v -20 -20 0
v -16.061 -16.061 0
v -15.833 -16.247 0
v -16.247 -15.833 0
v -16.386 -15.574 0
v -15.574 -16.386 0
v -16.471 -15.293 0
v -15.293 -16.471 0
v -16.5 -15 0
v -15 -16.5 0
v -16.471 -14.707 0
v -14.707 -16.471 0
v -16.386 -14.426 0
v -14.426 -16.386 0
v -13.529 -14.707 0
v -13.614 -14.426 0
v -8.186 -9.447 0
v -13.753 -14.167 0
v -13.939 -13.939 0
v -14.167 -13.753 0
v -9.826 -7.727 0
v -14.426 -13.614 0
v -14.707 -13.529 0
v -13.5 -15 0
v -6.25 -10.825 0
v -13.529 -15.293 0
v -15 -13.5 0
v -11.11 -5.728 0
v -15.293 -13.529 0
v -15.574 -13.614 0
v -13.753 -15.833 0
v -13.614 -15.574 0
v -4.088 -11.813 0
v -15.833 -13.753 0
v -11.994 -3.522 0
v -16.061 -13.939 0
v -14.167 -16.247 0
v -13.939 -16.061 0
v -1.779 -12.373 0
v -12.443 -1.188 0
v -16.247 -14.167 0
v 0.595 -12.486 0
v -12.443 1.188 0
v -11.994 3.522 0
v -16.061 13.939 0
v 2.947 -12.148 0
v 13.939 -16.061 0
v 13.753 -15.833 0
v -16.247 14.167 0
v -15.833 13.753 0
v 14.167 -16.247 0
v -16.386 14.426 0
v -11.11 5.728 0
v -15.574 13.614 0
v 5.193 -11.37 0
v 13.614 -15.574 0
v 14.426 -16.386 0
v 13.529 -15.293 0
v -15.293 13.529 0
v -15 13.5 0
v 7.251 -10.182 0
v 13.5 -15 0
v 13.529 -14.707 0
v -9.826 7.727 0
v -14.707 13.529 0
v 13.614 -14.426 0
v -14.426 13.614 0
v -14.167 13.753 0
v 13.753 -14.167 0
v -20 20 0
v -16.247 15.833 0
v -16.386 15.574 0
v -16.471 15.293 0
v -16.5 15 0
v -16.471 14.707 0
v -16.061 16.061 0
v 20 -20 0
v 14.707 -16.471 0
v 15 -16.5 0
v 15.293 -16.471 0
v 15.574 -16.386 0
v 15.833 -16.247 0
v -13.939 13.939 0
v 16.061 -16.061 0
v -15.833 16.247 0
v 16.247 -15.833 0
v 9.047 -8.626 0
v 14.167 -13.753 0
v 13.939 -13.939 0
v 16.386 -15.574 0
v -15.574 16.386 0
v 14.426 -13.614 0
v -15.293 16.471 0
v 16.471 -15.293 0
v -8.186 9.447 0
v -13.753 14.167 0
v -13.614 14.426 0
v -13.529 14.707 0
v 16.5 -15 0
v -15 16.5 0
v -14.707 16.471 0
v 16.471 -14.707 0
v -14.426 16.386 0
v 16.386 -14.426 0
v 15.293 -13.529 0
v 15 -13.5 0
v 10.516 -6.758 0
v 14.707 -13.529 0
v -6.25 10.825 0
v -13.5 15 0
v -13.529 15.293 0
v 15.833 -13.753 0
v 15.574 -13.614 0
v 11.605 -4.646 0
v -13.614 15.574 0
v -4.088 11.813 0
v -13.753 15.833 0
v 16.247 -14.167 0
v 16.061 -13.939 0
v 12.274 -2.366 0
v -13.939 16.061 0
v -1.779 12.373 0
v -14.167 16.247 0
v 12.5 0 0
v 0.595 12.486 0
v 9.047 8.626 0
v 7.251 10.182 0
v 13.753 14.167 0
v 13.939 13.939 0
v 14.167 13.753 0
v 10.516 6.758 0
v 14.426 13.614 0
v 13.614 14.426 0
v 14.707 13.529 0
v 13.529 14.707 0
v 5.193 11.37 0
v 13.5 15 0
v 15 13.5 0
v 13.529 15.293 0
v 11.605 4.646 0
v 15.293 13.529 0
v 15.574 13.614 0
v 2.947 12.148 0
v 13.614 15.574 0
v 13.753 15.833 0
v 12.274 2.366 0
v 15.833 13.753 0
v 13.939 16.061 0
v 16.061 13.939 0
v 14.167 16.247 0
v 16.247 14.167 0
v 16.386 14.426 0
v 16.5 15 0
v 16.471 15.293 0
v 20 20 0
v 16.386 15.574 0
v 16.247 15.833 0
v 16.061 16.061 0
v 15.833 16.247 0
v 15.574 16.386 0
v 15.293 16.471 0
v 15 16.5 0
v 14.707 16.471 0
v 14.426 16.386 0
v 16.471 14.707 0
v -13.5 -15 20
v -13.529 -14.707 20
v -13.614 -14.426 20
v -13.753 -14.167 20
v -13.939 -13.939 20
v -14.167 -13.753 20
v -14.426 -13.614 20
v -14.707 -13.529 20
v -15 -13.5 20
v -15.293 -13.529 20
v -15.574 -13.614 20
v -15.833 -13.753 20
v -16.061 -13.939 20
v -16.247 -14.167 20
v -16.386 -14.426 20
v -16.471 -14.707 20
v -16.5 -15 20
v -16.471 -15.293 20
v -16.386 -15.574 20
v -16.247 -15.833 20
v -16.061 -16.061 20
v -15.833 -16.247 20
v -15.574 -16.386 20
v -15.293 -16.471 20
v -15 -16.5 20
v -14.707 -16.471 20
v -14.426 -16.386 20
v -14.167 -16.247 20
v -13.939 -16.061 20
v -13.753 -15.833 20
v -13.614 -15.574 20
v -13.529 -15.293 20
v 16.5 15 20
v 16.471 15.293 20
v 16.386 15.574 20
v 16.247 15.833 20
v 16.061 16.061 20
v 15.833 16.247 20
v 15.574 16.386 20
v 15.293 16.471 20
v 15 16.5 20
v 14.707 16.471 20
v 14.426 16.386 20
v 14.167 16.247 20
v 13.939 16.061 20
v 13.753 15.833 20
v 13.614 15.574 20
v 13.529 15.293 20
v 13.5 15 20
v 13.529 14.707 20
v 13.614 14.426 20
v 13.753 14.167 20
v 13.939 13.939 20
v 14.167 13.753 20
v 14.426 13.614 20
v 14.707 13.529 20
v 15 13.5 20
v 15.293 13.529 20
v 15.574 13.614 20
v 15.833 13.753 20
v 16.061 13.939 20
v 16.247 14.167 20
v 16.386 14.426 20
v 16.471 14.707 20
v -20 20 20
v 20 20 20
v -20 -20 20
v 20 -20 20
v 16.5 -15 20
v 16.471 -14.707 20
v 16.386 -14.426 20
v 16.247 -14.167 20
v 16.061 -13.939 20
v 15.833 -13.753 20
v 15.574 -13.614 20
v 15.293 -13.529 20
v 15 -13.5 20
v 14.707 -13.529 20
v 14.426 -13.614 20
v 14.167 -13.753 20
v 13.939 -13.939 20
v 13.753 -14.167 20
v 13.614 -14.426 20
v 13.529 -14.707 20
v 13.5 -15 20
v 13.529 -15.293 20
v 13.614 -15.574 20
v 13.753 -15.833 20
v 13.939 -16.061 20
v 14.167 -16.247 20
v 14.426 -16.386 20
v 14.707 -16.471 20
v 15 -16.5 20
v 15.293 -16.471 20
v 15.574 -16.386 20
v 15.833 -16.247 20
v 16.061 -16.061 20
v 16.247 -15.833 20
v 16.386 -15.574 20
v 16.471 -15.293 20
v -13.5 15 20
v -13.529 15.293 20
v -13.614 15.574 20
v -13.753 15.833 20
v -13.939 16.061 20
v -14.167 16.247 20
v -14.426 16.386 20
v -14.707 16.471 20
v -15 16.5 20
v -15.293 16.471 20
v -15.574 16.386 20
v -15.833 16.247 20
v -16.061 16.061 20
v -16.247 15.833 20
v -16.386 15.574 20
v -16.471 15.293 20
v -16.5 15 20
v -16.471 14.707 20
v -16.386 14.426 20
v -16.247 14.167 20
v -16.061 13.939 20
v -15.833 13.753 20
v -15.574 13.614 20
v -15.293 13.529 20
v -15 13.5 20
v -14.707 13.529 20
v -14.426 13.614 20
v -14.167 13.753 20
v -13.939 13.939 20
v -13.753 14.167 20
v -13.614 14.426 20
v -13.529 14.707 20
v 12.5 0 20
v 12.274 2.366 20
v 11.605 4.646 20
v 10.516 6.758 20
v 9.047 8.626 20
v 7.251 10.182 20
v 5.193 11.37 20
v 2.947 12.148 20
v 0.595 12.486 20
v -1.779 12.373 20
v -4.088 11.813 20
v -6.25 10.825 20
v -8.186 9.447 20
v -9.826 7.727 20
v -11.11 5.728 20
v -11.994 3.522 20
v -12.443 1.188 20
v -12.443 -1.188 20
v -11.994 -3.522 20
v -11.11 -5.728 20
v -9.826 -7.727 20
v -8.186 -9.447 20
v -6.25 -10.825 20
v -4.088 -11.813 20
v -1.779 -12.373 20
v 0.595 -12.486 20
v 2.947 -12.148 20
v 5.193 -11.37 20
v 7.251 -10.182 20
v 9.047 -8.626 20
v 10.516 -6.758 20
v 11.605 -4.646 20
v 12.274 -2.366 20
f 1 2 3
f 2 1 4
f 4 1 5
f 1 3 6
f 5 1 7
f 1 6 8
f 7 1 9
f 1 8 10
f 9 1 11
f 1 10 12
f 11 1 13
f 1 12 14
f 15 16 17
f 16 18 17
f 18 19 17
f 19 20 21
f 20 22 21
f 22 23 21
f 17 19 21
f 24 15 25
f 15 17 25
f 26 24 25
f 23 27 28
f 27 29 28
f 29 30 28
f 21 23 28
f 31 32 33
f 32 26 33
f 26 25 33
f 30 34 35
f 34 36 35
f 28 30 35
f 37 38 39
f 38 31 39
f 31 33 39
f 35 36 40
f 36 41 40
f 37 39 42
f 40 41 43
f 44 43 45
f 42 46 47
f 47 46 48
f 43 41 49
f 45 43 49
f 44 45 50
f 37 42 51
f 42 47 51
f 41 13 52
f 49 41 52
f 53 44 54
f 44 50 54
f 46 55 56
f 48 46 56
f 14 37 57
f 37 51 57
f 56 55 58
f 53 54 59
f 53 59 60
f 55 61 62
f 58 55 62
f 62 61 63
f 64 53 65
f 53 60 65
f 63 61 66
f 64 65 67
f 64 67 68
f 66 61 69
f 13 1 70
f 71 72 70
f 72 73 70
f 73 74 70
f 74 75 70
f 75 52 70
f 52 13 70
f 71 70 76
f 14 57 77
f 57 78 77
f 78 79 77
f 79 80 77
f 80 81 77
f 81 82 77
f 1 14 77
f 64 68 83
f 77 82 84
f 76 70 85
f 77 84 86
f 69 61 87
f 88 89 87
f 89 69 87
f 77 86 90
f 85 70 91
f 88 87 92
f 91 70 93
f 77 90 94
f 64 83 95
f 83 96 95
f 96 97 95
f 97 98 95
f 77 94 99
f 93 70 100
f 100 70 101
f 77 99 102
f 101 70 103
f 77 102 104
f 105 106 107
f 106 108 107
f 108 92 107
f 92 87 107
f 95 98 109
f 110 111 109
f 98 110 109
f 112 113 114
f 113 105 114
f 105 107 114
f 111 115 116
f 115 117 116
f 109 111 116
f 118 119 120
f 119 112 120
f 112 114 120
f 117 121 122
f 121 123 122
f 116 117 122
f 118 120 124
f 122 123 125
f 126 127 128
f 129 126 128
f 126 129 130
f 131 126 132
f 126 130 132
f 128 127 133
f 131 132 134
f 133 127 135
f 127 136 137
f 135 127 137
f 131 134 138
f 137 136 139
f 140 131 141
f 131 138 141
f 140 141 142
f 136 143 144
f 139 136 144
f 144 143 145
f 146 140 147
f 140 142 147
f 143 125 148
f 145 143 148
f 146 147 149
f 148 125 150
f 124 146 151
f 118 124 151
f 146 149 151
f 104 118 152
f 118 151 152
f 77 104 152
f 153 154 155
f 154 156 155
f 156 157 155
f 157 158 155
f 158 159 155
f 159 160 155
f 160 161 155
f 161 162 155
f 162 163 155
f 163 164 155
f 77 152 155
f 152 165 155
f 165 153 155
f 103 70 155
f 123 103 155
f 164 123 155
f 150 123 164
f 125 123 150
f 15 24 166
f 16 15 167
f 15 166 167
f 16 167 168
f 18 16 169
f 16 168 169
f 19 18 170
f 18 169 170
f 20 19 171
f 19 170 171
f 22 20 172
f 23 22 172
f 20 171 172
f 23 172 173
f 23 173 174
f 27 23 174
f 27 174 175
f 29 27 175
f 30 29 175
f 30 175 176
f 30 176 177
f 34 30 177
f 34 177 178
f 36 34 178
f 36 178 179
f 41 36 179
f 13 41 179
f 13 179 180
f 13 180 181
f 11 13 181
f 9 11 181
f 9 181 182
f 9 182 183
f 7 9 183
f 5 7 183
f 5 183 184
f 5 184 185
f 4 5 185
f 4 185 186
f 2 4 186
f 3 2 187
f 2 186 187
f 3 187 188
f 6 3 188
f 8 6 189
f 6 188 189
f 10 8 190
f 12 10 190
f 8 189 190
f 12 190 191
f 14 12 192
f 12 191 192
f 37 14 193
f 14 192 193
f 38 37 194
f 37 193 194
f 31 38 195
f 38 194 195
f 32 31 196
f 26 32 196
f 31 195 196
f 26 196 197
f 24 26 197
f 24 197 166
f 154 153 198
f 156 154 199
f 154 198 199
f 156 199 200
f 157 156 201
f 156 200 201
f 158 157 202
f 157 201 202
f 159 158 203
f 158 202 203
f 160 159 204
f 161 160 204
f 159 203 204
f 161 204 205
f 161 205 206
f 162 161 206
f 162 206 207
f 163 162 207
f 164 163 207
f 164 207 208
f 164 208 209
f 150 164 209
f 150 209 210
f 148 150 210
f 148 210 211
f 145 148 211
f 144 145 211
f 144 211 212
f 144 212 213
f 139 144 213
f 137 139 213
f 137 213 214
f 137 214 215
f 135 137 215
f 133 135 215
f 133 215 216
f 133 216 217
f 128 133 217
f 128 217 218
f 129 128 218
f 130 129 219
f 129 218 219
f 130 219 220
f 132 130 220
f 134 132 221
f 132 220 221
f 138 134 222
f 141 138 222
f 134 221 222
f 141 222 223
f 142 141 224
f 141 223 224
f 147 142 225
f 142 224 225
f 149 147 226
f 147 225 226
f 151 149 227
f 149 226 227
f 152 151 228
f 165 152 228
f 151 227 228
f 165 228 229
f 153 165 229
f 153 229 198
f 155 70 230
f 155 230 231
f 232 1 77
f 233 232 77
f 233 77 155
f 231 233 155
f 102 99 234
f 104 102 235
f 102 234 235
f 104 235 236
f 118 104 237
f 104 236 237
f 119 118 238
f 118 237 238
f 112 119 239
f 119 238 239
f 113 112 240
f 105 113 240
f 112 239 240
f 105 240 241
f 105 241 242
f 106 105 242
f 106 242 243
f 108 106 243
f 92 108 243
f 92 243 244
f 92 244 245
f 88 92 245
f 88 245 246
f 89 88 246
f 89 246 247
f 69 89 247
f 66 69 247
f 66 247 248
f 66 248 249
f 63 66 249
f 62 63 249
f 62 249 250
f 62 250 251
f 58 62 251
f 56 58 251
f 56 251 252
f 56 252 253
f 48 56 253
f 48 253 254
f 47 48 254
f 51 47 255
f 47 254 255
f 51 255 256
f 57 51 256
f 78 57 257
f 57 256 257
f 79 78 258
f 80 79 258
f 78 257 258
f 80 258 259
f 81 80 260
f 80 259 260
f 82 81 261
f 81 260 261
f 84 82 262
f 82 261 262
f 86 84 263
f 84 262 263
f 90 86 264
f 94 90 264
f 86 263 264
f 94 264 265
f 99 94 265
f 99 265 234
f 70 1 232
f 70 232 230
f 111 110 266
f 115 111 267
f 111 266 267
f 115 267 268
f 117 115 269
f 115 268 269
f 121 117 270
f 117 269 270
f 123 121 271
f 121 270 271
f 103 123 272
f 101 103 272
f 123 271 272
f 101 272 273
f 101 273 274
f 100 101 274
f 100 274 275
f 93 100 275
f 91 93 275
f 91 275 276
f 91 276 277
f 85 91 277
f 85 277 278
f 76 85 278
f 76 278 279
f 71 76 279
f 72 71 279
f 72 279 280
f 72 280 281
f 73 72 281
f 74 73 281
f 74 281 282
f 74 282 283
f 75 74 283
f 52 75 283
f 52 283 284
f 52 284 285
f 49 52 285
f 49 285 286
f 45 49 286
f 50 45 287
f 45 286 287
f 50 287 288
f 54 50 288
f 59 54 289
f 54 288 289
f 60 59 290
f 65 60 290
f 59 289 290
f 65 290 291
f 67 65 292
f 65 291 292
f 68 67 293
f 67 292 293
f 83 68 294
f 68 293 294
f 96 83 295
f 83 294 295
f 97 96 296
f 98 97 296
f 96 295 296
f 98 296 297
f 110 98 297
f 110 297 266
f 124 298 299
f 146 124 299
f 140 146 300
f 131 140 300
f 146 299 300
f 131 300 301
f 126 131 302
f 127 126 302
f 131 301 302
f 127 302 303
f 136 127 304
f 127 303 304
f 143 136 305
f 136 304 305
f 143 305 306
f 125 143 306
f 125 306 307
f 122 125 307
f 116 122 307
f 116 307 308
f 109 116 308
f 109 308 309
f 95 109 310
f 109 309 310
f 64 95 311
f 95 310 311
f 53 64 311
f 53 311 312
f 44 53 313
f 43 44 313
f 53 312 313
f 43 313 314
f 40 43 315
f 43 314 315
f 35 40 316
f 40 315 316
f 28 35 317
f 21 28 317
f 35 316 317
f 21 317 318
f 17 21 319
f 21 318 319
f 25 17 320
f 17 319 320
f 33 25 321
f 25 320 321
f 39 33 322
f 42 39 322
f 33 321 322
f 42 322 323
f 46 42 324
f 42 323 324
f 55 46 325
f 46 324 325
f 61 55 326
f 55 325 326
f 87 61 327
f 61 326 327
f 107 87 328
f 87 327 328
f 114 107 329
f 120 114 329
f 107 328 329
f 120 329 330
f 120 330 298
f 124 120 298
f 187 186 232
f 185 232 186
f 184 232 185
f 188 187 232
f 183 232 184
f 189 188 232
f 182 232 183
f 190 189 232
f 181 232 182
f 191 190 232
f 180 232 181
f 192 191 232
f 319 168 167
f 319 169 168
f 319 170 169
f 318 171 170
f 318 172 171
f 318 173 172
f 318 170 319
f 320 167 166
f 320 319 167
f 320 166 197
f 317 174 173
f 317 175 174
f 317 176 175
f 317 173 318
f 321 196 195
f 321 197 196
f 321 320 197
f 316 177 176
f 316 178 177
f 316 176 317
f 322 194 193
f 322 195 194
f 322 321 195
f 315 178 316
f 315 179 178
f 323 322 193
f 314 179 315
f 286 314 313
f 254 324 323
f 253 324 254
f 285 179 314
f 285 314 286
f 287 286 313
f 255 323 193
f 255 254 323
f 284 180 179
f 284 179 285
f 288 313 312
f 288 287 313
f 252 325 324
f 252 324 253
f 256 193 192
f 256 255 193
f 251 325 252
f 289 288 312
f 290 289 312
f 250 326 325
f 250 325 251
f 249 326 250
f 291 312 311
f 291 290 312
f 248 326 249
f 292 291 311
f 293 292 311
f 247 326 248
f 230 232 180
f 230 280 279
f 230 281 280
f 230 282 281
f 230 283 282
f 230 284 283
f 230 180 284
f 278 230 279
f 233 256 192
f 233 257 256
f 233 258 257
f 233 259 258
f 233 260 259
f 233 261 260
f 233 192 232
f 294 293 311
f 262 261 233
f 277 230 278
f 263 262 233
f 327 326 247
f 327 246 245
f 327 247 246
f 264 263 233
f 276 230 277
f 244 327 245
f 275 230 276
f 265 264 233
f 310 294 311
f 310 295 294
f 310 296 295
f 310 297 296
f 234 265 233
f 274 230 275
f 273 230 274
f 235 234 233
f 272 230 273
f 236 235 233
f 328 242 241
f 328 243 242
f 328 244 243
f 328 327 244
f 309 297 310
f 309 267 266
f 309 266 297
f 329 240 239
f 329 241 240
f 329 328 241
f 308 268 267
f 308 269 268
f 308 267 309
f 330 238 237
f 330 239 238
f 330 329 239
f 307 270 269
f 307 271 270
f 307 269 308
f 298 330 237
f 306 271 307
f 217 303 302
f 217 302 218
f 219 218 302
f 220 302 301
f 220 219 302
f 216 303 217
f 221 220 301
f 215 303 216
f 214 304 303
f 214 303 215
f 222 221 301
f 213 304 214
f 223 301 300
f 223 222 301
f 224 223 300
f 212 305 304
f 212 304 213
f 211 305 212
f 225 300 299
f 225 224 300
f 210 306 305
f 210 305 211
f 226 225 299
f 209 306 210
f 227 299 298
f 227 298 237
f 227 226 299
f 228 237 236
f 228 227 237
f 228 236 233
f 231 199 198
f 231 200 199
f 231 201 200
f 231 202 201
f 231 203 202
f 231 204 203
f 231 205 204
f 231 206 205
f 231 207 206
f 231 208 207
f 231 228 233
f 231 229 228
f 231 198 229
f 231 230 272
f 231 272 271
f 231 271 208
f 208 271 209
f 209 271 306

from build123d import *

# Parameters (mm, degrees)
F0_W     = 40
F0_H     = 40
F1_DEPTH = 20
F2_R     = 12.5
F3_DEPTH = 20
F4_R     = 1.5
F5_DEPTH = 25.4


with BuildPart() as f1:
    # F0 (on Top) → F1 (new body)
    with BuildSketch(Plane.XY):
        Rectangle(F0_W, F0_H)
    extrude(amount=F1_DEPTH)

    # F2 (on face) → F3 (cut, through all)
    with BuildSketch(Plane.XY.offset(20)):
        Circle(F2_R)
    extrude(amount=-F3_DEPTH, mode=Mode.SUBTRACT)

    # F4 (on face) → F5 (cut)
    with BuildSketch(Plane.XY.offset(20)):
        with Locations((15, 15)):
            Circle(F4_R)
        with Locations((15, -15)):
            Circle(F4_R)
        with Locations((-15, -15)):
            Circle(F4_R)
        with Locations((-15, 15)):
            Circle(F4_R)
    extrude(amount=-F5_DEPTH, mode=Mode.SUBTRACT)


solid = f1.part
